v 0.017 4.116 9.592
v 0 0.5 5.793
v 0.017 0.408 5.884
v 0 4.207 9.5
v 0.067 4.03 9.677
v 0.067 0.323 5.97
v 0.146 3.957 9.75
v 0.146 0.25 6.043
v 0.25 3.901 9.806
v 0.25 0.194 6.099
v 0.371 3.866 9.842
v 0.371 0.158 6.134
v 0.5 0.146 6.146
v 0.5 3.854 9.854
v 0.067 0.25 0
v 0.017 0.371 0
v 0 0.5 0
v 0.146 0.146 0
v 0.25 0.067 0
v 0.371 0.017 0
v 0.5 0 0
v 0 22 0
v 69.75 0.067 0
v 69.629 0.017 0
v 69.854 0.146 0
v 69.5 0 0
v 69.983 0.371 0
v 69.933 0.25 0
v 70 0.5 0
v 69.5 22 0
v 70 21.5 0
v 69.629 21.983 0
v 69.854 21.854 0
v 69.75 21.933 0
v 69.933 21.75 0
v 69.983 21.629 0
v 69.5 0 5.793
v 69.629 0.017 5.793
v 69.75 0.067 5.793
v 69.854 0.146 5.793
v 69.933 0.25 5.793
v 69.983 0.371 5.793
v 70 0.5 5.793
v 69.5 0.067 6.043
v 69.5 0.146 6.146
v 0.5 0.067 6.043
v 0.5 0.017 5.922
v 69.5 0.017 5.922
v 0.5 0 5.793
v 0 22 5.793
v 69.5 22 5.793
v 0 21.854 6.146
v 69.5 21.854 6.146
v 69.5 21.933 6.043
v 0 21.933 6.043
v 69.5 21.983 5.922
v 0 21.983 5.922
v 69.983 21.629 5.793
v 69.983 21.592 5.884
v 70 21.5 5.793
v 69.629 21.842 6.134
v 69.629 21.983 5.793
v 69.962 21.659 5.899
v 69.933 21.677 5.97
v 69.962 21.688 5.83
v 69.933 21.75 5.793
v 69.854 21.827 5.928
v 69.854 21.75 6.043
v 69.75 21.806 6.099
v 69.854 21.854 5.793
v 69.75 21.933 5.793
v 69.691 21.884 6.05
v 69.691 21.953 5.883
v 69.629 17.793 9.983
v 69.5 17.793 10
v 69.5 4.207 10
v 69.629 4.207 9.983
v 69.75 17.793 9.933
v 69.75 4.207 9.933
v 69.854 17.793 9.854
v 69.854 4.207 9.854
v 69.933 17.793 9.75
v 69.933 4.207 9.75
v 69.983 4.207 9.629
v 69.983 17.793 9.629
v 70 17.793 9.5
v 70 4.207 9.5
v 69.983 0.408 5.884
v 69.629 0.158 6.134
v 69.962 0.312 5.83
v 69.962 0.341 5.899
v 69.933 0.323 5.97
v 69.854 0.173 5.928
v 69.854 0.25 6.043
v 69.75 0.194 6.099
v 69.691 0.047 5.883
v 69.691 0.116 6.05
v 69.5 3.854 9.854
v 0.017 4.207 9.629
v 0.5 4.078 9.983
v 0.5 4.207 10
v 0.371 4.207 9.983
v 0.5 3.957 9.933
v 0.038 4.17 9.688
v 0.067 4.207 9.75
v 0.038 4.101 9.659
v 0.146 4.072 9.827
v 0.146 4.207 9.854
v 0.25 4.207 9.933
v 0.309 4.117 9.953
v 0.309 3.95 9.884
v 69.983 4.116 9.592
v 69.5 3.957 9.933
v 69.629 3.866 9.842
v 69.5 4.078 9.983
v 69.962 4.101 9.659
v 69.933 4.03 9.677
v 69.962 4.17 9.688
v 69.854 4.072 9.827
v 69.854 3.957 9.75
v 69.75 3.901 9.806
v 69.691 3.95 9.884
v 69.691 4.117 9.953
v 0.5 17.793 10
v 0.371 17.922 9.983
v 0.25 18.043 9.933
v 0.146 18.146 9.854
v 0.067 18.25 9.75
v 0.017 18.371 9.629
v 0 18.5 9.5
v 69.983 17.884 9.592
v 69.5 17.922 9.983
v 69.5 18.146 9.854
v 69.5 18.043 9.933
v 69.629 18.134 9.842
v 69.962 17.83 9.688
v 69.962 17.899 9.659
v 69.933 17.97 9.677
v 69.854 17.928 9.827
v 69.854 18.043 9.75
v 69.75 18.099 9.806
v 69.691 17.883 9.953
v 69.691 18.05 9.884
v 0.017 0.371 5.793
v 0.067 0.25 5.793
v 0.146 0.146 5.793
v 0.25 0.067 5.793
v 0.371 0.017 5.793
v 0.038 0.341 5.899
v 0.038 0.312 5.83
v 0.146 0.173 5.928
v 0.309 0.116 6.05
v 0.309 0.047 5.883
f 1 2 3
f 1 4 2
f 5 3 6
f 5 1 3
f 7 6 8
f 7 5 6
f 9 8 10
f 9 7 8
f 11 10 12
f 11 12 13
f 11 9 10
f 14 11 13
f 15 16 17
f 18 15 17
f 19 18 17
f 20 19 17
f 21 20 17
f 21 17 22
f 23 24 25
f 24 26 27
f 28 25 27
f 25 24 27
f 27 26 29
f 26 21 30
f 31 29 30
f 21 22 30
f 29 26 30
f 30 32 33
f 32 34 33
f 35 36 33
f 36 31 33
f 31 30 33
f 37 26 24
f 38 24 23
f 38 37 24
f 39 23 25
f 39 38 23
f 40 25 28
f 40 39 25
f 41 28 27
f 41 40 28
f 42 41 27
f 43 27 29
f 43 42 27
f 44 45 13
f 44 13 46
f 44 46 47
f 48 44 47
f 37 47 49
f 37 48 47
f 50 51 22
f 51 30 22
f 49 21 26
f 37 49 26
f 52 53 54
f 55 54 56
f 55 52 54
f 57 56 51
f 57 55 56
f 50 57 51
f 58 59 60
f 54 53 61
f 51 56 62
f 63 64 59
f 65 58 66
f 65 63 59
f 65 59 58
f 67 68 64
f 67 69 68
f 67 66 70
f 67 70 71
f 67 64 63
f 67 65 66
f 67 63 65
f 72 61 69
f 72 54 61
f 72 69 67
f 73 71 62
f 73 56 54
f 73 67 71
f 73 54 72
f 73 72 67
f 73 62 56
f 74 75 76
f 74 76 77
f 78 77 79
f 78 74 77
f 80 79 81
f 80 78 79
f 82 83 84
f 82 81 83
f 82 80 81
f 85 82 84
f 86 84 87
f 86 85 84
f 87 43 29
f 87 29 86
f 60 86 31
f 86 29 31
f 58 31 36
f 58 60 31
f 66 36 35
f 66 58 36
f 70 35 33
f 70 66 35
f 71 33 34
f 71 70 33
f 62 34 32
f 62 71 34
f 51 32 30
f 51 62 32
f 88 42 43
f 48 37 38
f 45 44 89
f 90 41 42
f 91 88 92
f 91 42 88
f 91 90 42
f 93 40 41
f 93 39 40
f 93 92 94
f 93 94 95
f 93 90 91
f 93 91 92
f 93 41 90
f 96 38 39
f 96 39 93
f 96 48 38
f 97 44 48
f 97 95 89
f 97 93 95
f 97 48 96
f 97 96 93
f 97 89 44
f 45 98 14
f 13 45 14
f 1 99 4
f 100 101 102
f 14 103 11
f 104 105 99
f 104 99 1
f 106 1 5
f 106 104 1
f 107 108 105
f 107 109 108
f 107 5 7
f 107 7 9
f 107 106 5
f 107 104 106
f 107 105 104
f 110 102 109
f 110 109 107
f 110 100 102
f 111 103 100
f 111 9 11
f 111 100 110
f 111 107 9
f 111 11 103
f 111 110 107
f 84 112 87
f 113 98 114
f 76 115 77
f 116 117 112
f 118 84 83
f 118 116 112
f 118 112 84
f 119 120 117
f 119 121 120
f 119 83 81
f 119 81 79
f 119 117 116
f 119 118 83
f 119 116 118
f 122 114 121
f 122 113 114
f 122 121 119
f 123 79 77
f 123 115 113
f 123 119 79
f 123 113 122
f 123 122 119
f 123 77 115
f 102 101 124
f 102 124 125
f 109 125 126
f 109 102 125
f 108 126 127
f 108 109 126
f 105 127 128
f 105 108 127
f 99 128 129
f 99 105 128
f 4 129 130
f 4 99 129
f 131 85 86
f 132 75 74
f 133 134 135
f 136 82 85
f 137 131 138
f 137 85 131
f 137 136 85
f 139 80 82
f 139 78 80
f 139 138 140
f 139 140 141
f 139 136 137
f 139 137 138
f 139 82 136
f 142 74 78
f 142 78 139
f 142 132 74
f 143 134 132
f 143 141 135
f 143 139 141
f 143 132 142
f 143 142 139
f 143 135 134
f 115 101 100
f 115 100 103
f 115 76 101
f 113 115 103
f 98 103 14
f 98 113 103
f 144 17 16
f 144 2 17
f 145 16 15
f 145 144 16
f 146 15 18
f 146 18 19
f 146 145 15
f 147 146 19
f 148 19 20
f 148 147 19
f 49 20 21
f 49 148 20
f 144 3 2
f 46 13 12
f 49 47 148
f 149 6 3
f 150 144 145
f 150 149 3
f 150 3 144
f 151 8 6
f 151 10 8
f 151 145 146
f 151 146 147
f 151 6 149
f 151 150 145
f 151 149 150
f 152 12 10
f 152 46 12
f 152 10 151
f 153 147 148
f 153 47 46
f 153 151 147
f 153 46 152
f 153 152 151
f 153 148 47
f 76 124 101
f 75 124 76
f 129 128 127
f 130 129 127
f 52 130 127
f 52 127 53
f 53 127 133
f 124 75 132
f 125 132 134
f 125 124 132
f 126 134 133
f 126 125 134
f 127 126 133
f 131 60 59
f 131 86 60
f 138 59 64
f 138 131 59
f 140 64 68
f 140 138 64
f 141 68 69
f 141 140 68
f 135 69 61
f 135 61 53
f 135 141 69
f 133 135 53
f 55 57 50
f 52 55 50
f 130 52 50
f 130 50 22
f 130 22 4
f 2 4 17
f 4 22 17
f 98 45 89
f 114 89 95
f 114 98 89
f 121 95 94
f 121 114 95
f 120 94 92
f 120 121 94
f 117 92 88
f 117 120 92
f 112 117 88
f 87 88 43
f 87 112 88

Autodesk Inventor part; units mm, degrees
ref_plane "YZ Plane" through (0, 0, 0) normal (1, 0, 0) x (0, 1, 0)
ref_plane "XZ Plane" through (0, 0, 0) normal (0, 1, 0) x (-1, 0, 0)
ref_plane "XY Plane" through (0, 0, 0) normal (0, 0, 1) x (1, 0, 0)
sketch "Sketch1" plane through (0, 0, 0) normal (0, 0, 1) x (1, 0, 0)
  line L0 (0, 0) -> (70, 0)
  line L1 (70, 0) -> (70, 22)
  line L2 (70, 22) -> (0, 22)
  line L3 (0, 22) -> (0, 0)
  dimension "d0" = 70
  dimension "d1" = 22
extrude "Extrusion1" add sketch "Sketch1" along normal blind 10
chamfer "Chamfer1" distance 4 angle 45 2 edges at (35, 22, 10) (35, 0, 10)
fillet "Fillet1" radius 0.5 12 edges at (35, 22, 6) (35, 18, 10) (70, 20, 8) (70, 22, 3) (70, 11, 10) (70, 2, 8) (70, 0, 3) (35, 4, 10) (0, 11, 10) (0, 2, 8) (0, 0, 3) (35, 0, 6)
properties part number "batt_cap" material "Glass"
